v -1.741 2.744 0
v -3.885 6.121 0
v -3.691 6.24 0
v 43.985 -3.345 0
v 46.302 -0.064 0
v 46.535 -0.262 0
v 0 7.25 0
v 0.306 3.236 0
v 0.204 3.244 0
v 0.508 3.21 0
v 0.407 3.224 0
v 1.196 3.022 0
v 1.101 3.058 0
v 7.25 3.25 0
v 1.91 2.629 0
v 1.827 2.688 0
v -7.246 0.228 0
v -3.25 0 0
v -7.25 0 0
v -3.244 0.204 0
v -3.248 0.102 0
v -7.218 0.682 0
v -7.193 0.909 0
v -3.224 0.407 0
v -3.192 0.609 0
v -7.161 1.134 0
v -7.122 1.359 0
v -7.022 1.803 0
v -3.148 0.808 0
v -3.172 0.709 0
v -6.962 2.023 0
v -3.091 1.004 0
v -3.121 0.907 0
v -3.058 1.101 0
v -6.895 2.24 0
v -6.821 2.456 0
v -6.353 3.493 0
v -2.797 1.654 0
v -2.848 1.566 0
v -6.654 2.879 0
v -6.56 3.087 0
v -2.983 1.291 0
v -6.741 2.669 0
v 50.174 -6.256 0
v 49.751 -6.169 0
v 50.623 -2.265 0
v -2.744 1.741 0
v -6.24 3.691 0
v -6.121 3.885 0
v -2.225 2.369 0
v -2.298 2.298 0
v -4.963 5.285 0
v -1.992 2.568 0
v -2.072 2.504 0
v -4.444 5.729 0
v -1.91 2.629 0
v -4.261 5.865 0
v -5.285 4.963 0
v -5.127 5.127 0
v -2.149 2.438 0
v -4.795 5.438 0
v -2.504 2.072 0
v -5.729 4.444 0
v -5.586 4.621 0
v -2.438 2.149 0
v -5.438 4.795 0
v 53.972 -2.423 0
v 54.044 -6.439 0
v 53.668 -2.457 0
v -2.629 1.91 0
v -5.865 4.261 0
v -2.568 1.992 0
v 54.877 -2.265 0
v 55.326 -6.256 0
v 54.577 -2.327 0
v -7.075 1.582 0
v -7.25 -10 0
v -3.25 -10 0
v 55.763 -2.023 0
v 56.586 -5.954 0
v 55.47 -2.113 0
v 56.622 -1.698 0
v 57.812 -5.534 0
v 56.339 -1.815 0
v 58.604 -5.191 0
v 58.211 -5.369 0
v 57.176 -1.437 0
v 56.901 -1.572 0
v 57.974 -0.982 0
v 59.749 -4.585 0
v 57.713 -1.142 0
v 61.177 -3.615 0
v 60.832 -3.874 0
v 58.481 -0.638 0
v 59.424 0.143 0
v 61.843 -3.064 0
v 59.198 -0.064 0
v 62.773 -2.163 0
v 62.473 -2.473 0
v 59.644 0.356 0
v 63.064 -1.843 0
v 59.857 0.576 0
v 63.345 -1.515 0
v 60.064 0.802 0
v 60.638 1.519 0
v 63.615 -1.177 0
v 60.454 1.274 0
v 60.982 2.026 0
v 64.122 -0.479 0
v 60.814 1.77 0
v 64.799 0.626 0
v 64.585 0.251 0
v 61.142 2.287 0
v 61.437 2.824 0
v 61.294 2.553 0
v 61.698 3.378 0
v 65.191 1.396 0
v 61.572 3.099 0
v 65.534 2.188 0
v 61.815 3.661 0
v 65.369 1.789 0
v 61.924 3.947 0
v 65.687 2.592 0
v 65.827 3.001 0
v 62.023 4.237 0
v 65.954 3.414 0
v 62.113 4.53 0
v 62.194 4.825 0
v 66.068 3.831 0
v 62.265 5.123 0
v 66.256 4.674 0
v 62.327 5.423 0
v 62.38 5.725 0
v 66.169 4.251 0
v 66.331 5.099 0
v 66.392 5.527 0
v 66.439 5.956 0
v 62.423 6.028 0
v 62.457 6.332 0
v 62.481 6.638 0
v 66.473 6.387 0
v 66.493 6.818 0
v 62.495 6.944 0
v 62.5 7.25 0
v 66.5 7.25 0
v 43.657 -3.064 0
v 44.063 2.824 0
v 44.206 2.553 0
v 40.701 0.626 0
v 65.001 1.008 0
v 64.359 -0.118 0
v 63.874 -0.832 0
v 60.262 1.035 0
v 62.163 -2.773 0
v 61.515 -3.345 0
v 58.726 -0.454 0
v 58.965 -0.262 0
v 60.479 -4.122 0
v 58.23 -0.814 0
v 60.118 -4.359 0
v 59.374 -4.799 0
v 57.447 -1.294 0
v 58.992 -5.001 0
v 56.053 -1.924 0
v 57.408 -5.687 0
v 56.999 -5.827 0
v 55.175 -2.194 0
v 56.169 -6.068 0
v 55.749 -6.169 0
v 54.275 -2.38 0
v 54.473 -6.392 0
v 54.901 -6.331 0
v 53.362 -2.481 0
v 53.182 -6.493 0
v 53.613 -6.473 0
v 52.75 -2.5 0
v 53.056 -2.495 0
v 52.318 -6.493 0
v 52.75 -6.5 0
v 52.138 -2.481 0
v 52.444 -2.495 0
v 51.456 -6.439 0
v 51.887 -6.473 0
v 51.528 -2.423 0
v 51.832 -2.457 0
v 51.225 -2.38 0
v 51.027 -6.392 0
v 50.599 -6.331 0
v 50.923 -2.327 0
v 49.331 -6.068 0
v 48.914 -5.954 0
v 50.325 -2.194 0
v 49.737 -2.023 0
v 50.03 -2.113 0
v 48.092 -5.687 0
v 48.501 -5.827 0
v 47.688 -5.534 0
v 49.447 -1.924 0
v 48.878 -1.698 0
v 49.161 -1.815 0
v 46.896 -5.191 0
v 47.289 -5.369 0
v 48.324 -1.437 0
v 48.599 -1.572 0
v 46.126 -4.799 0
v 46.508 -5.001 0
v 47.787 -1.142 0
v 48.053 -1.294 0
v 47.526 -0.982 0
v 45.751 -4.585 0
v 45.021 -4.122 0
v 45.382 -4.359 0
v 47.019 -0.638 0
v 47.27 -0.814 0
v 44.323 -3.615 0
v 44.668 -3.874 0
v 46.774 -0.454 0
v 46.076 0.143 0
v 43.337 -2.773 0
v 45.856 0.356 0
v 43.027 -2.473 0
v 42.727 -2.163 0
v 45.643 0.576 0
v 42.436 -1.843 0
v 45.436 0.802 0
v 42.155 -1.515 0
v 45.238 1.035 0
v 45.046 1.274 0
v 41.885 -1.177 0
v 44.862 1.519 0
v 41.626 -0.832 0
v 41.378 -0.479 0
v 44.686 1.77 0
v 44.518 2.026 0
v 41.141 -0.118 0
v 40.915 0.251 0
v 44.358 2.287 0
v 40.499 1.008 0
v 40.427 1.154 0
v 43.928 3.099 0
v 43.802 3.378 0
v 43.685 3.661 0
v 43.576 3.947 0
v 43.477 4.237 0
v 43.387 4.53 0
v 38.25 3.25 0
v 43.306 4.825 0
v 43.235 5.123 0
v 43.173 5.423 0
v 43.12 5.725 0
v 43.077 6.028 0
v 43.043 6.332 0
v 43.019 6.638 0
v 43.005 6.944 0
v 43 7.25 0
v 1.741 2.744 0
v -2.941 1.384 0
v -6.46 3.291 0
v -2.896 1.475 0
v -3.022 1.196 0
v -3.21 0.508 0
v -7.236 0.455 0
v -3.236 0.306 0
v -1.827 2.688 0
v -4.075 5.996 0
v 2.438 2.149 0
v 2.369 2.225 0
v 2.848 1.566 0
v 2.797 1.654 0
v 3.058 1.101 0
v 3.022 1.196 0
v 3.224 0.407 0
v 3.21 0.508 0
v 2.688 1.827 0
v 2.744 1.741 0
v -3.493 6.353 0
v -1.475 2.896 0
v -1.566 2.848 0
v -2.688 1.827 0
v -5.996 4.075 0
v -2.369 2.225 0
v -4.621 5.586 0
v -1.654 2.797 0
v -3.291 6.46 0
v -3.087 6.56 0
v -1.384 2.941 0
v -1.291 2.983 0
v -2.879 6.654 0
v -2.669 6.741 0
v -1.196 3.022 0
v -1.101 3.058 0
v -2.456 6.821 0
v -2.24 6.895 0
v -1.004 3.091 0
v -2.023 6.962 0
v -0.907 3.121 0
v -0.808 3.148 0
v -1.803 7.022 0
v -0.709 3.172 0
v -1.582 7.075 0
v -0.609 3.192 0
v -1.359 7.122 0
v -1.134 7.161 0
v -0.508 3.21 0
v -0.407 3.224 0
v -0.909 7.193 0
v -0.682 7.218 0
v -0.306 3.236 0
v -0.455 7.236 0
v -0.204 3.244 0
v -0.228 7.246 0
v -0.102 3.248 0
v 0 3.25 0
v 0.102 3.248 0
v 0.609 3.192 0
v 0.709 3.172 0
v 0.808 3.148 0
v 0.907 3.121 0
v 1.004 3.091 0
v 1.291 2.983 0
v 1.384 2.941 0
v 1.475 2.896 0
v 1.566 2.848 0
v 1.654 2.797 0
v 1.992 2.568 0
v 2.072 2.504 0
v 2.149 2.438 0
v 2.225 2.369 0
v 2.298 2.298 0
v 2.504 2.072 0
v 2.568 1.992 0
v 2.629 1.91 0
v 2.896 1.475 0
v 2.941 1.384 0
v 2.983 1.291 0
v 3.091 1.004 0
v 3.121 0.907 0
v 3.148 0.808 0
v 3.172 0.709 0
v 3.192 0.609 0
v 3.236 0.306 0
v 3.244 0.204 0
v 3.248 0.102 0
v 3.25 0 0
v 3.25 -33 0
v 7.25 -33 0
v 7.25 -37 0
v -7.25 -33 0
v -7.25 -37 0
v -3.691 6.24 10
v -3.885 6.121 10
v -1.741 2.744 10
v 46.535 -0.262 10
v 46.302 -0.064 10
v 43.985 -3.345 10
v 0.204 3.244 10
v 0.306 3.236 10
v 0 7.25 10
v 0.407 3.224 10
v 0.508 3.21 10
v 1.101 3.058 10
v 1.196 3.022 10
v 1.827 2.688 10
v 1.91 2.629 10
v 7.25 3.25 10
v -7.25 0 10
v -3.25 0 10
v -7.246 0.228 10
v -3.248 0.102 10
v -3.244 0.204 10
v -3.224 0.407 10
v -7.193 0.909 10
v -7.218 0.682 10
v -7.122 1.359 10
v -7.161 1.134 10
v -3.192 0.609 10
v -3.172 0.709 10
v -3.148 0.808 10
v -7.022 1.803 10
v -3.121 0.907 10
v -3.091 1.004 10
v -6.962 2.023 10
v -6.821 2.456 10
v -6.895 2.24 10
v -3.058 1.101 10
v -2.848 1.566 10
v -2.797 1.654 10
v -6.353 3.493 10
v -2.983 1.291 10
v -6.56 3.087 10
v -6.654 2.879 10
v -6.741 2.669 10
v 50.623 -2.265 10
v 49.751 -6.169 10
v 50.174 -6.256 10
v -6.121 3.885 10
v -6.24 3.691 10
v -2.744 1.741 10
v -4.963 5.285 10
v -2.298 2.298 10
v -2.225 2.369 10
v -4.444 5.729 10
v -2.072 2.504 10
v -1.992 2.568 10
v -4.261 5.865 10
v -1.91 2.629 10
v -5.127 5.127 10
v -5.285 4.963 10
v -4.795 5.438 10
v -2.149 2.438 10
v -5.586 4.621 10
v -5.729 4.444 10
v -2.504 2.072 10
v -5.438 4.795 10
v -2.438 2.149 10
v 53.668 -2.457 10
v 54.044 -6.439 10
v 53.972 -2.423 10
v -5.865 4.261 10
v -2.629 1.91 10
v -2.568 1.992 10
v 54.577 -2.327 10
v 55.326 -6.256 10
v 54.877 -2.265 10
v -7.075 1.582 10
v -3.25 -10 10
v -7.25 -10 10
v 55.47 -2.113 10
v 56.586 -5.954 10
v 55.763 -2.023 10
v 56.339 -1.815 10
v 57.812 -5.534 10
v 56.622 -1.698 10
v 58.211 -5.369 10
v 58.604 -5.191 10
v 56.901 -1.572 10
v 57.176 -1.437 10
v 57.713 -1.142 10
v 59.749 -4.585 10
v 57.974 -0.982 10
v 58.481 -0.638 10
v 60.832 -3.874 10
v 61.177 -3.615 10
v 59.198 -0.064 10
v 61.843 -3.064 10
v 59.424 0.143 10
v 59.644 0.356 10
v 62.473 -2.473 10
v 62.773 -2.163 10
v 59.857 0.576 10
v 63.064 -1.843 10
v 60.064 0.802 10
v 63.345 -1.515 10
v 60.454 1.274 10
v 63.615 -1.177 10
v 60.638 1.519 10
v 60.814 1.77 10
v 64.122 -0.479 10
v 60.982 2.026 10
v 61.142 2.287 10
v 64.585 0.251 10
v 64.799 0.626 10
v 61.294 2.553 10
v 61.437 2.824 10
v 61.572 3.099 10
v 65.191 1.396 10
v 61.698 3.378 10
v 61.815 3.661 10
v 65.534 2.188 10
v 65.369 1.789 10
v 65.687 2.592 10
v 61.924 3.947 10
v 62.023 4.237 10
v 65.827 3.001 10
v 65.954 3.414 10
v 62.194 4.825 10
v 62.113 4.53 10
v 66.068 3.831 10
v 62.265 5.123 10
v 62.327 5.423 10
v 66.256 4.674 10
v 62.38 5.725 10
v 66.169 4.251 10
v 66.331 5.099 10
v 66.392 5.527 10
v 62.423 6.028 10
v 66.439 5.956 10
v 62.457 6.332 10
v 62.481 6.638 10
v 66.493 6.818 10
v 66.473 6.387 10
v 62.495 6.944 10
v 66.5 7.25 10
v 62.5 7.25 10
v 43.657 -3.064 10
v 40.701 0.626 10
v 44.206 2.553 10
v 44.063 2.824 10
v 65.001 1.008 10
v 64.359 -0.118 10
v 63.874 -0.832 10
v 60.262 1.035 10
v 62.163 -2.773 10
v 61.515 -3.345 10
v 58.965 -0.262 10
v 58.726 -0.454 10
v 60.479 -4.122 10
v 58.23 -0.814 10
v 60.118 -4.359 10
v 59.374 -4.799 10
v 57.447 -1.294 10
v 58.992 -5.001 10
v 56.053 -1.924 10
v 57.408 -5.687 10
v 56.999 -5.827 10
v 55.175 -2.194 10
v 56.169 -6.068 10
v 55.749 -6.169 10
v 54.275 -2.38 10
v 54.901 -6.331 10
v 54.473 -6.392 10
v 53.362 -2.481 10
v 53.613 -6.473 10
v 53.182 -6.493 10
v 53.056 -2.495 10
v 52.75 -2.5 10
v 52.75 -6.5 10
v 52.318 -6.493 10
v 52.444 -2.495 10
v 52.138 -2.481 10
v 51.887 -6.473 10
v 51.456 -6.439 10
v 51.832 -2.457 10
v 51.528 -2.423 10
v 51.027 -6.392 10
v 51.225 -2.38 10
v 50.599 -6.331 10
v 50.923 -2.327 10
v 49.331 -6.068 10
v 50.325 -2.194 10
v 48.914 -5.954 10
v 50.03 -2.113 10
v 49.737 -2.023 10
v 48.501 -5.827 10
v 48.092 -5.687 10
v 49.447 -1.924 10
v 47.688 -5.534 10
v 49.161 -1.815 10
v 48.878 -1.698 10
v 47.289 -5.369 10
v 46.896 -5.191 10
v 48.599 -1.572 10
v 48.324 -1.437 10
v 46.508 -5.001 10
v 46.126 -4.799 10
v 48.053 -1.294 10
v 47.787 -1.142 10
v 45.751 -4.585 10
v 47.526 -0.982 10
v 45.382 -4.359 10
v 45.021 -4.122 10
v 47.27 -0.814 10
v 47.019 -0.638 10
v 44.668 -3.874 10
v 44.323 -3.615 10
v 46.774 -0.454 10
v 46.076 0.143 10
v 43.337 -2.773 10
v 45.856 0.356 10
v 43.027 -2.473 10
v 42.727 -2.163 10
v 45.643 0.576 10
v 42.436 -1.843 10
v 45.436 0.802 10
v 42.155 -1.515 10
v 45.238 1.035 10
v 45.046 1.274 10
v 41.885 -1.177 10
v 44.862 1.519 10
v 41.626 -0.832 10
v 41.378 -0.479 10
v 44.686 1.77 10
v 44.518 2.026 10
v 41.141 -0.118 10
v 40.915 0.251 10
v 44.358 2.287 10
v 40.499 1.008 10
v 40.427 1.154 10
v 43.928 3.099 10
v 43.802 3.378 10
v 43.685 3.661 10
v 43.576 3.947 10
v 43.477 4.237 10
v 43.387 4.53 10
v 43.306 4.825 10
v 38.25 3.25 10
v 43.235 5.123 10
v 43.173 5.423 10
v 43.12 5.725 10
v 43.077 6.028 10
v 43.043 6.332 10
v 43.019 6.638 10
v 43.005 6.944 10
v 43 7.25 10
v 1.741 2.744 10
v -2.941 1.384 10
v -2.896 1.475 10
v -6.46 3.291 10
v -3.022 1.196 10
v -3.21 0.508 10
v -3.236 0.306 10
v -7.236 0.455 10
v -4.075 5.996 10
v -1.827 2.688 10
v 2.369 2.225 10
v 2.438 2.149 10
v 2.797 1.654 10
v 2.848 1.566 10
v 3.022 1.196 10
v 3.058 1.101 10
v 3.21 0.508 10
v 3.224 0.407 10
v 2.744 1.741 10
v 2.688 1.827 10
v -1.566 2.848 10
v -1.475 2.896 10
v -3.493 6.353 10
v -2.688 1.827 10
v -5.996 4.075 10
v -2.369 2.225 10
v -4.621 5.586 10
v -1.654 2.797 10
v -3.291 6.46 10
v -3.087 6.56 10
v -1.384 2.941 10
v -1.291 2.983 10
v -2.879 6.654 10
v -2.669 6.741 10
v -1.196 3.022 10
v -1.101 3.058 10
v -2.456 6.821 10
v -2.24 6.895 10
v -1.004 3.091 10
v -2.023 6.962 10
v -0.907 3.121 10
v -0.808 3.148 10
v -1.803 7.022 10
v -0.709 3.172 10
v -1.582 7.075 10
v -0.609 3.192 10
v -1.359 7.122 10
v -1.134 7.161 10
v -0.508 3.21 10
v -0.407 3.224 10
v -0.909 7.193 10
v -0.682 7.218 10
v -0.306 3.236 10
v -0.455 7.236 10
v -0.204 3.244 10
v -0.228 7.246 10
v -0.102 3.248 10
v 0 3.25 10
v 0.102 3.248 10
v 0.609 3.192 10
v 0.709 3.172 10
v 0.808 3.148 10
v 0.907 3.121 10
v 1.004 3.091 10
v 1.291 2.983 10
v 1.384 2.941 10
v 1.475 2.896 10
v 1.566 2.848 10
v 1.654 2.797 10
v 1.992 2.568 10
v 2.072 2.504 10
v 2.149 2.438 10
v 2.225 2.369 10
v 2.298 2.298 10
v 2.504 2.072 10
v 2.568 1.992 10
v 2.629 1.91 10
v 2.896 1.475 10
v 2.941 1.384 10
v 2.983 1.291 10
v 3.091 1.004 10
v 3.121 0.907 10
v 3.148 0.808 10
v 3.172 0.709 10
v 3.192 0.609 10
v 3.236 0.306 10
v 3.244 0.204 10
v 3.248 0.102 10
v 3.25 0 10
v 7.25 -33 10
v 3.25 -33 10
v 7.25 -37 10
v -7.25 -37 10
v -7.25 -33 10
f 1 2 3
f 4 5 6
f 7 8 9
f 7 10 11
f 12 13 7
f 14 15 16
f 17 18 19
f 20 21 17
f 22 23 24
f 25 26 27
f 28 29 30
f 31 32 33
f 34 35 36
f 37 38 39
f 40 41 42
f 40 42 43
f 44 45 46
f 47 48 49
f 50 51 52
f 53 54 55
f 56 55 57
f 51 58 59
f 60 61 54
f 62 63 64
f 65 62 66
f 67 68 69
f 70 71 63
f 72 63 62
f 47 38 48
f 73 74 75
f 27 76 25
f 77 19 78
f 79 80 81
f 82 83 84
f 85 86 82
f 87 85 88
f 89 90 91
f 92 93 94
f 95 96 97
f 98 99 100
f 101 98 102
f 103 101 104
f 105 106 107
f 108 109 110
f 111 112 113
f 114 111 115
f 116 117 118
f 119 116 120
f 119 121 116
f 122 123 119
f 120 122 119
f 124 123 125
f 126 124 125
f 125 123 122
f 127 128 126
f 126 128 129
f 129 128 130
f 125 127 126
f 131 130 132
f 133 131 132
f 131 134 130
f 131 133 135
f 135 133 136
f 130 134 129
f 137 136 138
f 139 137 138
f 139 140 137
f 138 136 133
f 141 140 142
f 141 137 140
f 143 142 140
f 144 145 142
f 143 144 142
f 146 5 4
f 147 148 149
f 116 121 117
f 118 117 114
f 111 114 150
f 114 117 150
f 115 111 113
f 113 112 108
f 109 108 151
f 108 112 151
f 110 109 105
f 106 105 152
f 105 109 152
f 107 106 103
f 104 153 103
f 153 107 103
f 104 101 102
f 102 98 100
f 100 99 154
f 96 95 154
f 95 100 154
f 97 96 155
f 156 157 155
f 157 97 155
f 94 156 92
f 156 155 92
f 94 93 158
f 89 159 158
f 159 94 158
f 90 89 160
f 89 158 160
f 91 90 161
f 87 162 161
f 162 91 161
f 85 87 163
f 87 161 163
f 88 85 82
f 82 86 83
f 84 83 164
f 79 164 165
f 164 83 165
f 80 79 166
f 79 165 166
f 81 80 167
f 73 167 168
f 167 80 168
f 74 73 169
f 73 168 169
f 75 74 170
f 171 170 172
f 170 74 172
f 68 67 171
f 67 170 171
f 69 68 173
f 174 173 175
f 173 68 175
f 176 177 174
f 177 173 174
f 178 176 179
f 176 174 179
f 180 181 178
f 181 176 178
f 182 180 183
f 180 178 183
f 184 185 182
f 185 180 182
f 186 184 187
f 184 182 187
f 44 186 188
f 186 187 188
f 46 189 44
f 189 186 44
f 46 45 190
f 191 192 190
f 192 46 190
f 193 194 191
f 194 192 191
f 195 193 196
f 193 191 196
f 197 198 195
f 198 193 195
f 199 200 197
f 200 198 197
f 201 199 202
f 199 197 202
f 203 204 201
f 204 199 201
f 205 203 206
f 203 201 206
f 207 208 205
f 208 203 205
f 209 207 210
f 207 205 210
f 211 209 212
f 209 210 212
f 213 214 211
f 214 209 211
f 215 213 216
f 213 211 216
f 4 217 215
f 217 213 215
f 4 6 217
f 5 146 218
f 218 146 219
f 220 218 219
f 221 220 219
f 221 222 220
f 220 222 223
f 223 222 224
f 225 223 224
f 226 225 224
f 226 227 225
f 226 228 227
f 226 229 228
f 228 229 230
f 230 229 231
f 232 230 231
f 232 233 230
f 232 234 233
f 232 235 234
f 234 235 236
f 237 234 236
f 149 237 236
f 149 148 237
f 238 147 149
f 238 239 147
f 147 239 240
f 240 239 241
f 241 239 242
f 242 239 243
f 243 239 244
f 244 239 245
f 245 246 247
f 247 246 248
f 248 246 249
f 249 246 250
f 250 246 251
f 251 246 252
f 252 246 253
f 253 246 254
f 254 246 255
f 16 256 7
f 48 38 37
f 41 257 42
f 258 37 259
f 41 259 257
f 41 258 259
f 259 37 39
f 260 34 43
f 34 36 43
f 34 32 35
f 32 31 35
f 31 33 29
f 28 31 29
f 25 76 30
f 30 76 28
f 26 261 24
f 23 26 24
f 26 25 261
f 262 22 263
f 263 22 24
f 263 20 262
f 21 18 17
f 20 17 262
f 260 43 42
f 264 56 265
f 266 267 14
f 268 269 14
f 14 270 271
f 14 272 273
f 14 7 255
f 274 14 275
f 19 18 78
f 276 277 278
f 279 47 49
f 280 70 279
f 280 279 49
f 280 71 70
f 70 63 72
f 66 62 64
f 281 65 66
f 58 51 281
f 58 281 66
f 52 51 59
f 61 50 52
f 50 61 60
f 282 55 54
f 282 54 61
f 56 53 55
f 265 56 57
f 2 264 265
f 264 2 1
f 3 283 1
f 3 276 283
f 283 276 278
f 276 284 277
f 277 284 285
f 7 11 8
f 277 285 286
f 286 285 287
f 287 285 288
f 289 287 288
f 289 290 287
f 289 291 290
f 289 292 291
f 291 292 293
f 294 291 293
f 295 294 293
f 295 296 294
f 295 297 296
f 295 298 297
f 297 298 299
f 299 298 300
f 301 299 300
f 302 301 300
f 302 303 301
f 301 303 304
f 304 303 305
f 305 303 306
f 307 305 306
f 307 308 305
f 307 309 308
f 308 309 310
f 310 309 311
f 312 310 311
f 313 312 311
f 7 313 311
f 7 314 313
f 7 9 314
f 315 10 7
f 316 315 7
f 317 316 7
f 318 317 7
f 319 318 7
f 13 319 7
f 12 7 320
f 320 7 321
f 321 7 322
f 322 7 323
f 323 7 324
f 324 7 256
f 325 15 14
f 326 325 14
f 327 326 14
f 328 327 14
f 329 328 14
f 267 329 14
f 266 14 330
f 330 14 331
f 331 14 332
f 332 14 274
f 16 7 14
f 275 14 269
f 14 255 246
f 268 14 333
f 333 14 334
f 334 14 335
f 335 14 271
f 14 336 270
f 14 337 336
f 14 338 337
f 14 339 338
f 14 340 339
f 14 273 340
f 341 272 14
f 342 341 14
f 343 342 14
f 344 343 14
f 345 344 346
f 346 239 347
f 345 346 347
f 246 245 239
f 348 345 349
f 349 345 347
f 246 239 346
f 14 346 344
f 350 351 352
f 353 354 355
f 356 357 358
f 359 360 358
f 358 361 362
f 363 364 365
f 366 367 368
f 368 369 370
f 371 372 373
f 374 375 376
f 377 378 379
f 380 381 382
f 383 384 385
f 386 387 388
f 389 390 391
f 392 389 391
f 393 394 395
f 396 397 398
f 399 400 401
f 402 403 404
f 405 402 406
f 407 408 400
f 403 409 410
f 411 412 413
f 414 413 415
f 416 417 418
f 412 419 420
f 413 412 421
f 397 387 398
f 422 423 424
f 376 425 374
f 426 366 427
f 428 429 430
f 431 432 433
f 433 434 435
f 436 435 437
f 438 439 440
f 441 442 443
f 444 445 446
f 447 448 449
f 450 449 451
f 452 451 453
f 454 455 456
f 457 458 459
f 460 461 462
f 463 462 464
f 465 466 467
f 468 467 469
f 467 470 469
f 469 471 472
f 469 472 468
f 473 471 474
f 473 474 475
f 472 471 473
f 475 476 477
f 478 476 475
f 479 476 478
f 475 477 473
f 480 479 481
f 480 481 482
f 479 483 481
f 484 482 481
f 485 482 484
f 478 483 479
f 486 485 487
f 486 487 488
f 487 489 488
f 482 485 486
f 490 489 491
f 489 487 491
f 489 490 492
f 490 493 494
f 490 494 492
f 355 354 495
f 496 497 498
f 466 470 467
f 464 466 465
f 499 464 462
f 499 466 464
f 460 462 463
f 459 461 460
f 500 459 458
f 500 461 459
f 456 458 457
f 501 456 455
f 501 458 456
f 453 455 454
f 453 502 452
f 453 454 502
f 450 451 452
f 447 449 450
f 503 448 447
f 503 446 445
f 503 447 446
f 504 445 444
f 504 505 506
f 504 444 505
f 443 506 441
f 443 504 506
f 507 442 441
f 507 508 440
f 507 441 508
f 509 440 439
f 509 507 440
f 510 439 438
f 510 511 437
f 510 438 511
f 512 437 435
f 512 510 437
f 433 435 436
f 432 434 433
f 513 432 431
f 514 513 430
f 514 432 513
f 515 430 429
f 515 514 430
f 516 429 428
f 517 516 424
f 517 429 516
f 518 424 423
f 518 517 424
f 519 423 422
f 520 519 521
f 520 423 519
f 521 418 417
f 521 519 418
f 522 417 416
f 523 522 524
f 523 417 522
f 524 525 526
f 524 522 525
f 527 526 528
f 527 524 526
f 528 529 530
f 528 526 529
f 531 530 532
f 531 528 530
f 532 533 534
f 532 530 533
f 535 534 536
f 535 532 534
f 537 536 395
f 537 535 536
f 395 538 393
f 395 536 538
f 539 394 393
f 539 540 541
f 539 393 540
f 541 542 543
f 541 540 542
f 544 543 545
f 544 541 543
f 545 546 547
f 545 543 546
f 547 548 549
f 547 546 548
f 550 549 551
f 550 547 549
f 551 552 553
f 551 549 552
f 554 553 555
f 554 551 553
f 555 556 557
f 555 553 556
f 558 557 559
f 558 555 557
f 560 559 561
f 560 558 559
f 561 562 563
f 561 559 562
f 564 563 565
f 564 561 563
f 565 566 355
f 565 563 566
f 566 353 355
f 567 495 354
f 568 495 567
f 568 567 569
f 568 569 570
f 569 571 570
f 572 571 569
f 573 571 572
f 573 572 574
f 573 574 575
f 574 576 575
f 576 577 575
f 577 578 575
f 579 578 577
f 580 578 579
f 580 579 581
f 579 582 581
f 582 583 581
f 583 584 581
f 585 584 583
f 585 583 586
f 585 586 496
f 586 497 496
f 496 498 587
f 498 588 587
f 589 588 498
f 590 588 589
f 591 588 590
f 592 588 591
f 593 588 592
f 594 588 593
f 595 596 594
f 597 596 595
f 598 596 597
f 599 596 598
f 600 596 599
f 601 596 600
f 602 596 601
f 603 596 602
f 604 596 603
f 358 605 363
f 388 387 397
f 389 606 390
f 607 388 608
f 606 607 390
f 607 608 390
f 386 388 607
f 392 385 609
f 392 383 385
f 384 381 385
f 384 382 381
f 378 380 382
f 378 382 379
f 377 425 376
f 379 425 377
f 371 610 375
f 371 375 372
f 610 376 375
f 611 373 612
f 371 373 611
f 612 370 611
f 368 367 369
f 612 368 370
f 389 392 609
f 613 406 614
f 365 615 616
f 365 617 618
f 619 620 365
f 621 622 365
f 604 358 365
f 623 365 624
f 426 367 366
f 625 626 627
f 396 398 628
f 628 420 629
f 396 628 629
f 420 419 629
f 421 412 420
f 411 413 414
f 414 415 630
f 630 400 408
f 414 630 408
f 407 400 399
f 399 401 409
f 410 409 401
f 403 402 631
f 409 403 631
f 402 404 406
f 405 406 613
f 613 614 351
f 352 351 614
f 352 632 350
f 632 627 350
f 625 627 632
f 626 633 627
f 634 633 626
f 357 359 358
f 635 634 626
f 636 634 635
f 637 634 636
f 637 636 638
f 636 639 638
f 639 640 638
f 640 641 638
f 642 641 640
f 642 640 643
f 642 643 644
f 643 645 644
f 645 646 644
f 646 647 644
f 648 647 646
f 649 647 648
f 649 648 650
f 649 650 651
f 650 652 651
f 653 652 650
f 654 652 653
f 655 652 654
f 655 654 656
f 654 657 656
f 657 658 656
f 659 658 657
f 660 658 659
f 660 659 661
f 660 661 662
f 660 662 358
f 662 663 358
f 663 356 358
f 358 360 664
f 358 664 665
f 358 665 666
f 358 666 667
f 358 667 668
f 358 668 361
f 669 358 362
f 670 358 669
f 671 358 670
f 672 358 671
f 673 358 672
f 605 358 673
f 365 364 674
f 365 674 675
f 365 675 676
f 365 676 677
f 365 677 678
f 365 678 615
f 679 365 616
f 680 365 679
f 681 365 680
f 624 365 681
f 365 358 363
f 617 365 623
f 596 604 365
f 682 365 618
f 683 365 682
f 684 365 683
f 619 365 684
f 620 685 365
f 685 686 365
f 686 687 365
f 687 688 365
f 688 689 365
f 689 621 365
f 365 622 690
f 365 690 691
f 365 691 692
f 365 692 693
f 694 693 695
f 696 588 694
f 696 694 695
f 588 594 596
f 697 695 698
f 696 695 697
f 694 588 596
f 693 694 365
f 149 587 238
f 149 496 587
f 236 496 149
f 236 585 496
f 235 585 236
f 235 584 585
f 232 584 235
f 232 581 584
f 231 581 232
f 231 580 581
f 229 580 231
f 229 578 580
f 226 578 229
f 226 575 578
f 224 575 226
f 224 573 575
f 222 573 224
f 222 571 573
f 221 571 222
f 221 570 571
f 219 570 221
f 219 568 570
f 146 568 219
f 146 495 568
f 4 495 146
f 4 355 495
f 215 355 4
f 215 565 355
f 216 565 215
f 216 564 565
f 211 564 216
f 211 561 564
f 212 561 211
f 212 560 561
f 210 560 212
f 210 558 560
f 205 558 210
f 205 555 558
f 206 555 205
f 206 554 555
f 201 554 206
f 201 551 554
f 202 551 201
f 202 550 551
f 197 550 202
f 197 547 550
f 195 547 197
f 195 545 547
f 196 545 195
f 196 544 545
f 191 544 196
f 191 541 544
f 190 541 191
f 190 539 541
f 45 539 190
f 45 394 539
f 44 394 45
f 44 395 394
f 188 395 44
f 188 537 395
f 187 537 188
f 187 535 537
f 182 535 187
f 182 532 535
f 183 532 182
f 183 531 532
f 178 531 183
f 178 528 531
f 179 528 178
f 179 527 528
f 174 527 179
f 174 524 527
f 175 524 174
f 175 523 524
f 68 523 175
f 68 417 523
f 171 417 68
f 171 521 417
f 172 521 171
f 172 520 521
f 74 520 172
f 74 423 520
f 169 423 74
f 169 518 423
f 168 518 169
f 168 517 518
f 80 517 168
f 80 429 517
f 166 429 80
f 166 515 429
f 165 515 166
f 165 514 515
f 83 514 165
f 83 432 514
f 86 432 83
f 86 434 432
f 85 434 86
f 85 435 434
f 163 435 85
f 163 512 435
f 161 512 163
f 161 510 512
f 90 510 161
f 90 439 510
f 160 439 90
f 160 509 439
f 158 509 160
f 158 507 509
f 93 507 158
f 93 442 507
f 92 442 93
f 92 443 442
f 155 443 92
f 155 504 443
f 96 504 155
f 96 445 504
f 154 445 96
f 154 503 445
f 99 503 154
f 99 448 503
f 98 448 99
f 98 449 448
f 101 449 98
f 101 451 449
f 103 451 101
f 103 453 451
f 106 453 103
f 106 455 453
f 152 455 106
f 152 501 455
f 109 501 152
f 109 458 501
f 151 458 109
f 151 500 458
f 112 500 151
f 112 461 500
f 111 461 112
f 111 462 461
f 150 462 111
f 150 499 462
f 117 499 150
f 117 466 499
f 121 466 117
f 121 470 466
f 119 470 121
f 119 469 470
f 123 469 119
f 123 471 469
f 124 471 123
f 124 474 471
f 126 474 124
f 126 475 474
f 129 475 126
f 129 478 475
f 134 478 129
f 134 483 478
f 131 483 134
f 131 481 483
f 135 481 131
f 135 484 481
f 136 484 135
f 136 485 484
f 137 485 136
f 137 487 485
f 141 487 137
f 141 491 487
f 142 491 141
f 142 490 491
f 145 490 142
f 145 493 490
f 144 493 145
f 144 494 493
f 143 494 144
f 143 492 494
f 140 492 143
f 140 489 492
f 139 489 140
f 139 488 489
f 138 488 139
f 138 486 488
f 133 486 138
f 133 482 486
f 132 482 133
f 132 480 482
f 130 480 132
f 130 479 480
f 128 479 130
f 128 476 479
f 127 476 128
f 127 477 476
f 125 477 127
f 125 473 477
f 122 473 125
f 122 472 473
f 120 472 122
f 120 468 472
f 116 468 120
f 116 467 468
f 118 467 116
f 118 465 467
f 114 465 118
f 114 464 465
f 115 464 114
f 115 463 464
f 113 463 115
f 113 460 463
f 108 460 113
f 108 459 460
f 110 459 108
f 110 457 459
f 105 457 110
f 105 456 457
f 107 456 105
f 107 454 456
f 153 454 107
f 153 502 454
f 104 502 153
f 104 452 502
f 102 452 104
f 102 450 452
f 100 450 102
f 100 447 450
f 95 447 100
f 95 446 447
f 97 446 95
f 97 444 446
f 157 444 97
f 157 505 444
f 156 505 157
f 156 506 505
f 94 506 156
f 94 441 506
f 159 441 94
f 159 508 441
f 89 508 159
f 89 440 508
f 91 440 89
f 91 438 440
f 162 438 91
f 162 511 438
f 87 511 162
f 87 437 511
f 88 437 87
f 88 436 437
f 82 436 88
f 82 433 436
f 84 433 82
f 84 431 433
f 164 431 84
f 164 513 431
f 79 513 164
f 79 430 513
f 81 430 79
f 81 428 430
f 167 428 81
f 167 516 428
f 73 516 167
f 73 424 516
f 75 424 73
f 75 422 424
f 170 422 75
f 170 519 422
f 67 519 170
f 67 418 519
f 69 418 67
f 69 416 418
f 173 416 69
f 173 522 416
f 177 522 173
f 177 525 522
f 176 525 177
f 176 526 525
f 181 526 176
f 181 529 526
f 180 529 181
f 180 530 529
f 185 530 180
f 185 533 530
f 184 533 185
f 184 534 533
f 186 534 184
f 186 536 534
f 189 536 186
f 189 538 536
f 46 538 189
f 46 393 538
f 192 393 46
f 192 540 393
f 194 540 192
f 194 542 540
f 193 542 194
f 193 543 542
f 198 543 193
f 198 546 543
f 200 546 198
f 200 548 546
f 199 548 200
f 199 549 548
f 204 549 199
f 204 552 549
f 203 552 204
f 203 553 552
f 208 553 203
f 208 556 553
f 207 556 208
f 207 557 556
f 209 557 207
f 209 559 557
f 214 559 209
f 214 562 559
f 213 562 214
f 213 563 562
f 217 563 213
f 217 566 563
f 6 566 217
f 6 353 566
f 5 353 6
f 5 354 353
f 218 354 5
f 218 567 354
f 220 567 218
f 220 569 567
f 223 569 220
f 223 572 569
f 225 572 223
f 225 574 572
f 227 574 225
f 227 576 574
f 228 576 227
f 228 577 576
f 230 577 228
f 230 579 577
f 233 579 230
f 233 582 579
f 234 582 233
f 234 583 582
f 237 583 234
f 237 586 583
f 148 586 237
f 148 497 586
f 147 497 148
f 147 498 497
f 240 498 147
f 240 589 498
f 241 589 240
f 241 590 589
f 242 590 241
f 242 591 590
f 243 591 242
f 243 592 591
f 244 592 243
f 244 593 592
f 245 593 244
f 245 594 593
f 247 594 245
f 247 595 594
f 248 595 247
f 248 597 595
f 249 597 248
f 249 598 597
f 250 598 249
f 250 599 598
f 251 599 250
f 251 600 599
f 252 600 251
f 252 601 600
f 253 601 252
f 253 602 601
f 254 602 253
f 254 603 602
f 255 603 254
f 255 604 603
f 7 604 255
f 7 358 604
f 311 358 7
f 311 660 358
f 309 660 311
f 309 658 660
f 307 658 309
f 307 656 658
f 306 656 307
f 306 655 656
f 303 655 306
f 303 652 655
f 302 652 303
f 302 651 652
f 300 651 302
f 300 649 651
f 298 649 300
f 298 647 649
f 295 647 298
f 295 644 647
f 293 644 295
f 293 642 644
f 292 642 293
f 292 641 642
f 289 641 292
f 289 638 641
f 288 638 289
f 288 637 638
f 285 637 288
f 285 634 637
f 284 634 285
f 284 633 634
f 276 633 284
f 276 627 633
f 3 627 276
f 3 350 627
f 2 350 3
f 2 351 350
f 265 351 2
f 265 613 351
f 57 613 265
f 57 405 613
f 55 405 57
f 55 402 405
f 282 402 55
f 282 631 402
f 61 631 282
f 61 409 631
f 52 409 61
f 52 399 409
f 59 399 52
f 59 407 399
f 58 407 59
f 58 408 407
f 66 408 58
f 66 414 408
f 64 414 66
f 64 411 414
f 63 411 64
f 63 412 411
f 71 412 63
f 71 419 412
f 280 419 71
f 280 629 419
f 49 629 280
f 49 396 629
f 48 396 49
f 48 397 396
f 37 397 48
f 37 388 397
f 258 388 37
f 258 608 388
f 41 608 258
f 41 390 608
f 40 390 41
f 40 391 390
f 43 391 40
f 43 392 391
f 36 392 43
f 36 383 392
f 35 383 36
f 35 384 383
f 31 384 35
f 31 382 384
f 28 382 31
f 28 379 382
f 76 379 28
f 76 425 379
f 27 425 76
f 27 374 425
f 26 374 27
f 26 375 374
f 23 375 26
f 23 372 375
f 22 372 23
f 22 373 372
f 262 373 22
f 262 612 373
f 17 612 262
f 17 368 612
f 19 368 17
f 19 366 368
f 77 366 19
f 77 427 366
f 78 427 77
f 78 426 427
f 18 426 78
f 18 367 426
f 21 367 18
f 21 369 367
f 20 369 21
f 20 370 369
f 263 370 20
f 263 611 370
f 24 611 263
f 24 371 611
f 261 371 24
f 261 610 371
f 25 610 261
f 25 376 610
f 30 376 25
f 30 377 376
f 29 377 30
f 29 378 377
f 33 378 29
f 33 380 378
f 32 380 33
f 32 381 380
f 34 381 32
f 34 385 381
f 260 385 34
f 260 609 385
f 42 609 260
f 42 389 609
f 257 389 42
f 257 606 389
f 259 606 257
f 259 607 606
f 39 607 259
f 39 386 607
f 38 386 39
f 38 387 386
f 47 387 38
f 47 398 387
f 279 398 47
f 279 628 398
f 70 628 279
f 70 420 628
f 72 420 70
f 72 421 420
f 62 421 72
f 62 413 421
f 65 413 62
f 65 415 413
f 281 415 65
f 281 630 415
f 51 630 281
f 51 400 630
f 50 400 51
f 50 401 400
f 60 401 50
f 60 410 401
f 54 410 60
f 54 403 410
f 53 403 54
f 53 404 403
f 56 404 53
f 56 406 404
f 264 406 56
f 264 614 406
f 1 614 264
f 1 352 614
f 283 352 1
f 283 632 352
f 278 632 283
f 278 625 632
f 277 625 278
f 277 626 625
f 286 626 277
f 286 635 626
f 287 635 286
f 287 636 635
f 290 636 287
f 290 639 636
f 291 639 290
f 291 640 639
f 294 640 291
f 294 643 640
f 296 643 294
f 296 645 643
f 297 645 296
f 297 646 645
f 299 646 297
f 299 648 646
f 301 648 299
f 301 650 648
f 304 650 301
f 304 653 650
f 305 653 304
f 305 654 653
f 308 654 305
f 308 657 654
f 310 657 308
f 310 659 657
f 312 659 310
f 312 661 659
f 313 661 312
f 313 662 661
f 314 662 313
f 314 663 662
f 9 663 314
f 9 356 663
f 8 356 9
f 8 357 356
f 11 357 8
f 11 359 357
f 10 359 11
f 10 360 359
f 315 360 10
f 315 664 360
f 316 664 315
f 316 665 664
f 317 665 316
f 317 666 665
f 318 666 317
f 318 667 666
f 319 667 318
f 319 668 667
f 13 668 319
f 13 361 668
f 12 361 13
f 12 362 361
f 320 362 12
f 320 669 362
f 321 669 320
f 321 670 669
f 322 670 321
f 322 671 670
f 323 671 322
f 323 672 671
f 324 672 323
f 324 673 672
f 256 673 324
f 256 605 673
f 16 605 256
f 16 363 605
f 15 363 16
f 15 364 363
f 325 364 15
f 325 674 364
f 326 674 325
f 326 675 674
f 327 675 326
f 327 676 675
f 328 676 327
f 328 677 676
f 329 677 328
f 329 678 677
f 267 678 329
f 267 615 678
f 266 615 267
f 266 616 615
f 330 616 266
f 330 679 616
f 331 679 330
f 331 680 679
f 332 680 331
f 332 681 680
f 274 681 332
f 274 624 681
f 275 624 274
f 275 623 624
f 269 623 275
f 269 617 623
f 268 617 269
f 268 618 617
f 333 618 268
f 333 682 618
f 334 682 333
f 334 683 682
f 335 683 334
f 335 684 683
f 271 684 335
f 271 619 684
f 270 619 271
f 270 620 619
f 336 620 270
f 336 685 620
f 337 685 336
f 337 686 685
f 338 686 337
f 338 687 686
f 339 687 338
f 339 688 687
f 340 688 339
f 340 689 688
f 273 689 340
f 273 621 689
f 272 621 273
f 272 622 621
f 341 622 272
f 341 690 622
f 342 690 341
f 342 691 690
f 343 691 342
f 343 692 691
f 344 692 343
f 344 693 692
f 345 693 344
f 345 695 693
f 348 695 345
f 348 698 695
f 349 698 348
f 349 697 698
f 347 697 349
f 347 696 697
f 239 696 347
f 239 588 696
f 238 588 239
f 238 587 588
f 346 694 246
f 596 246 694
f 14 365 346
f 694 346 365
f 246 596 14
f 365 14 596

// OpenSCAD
$fn=200;
rackHeight=33;
rackPinInnerDiameter=6.5;
rackBackLength=10;
hookDepth=4;
hookWidth=35;
endHookScale=3;


linear_extrude(10) {
    difference() {
        difference() {
            circle(d=rackPinInnerDiameter+(hookDepth*2));
            circle(d=rackPinInnerDiameter);
        }
        translate([0,-(rackPinInnerDiameter+(hookDepth*2))/2,0]) square(rackPinInnerDiameter+(hookDepth*2), true);
    }
    translate([rackPinInnerDiameter/2,-rackHeight,0]) square([hookDepth, rackHeight]);
    translate([-(rackPinInnerDiameter/2 + hookDepth),-rackBackLength,0]) square([hookDepth, rackBackLength]);
    translate([0,-(rackHeight+(hookDepth/2)),0]) square([rackPinInnerDiameter+(hookDepth*2), hookDepth], true);
    translate([0,rackPinInnerDiameter/2, 0]) square([rackPinInnerDiameter/2+hookDepth, hookDepth]);
    translate([rackPinInnerDiameter/2, 0, 0]) square([hookDepth, hookDepth+1]);
    translate([rackPinInnerDiameter/2+hookDepth,rackPinInnerDiameter/2,0]) union() {
        square([hookWidth, hookDepth]);
        polygon([
            [hookWidth-hookDepth,0], 
            [hookWidth, 0], 
            [0, -rackHeight-hookDepth-(rackPinInnerDiameter/2)],
            [0, -rackHeight-(rackPinInnerDiameter/2)]
        ]);
    }
    translate([hookWidth+((rackPinInnerDiameter/2)*endHookScale+(hookDepth))+hookDepth, (rackPinInnerDiameter/2)+hookDepth, 0]) difference() {
        difference() {
            circle(d=(rackPinInnerDiameter*endHookScale)+(hookDepth*2));
            circle(d=(rackPinInnerDiameter*endHookScale));
        }
        translate([0,((rackPinInnerDiameter*endHookScale)+(hookDepth*2))/2,0]) square((rackPinInnerDiameter*endHookScale)+(hookDepth*2), true);
    }
}
